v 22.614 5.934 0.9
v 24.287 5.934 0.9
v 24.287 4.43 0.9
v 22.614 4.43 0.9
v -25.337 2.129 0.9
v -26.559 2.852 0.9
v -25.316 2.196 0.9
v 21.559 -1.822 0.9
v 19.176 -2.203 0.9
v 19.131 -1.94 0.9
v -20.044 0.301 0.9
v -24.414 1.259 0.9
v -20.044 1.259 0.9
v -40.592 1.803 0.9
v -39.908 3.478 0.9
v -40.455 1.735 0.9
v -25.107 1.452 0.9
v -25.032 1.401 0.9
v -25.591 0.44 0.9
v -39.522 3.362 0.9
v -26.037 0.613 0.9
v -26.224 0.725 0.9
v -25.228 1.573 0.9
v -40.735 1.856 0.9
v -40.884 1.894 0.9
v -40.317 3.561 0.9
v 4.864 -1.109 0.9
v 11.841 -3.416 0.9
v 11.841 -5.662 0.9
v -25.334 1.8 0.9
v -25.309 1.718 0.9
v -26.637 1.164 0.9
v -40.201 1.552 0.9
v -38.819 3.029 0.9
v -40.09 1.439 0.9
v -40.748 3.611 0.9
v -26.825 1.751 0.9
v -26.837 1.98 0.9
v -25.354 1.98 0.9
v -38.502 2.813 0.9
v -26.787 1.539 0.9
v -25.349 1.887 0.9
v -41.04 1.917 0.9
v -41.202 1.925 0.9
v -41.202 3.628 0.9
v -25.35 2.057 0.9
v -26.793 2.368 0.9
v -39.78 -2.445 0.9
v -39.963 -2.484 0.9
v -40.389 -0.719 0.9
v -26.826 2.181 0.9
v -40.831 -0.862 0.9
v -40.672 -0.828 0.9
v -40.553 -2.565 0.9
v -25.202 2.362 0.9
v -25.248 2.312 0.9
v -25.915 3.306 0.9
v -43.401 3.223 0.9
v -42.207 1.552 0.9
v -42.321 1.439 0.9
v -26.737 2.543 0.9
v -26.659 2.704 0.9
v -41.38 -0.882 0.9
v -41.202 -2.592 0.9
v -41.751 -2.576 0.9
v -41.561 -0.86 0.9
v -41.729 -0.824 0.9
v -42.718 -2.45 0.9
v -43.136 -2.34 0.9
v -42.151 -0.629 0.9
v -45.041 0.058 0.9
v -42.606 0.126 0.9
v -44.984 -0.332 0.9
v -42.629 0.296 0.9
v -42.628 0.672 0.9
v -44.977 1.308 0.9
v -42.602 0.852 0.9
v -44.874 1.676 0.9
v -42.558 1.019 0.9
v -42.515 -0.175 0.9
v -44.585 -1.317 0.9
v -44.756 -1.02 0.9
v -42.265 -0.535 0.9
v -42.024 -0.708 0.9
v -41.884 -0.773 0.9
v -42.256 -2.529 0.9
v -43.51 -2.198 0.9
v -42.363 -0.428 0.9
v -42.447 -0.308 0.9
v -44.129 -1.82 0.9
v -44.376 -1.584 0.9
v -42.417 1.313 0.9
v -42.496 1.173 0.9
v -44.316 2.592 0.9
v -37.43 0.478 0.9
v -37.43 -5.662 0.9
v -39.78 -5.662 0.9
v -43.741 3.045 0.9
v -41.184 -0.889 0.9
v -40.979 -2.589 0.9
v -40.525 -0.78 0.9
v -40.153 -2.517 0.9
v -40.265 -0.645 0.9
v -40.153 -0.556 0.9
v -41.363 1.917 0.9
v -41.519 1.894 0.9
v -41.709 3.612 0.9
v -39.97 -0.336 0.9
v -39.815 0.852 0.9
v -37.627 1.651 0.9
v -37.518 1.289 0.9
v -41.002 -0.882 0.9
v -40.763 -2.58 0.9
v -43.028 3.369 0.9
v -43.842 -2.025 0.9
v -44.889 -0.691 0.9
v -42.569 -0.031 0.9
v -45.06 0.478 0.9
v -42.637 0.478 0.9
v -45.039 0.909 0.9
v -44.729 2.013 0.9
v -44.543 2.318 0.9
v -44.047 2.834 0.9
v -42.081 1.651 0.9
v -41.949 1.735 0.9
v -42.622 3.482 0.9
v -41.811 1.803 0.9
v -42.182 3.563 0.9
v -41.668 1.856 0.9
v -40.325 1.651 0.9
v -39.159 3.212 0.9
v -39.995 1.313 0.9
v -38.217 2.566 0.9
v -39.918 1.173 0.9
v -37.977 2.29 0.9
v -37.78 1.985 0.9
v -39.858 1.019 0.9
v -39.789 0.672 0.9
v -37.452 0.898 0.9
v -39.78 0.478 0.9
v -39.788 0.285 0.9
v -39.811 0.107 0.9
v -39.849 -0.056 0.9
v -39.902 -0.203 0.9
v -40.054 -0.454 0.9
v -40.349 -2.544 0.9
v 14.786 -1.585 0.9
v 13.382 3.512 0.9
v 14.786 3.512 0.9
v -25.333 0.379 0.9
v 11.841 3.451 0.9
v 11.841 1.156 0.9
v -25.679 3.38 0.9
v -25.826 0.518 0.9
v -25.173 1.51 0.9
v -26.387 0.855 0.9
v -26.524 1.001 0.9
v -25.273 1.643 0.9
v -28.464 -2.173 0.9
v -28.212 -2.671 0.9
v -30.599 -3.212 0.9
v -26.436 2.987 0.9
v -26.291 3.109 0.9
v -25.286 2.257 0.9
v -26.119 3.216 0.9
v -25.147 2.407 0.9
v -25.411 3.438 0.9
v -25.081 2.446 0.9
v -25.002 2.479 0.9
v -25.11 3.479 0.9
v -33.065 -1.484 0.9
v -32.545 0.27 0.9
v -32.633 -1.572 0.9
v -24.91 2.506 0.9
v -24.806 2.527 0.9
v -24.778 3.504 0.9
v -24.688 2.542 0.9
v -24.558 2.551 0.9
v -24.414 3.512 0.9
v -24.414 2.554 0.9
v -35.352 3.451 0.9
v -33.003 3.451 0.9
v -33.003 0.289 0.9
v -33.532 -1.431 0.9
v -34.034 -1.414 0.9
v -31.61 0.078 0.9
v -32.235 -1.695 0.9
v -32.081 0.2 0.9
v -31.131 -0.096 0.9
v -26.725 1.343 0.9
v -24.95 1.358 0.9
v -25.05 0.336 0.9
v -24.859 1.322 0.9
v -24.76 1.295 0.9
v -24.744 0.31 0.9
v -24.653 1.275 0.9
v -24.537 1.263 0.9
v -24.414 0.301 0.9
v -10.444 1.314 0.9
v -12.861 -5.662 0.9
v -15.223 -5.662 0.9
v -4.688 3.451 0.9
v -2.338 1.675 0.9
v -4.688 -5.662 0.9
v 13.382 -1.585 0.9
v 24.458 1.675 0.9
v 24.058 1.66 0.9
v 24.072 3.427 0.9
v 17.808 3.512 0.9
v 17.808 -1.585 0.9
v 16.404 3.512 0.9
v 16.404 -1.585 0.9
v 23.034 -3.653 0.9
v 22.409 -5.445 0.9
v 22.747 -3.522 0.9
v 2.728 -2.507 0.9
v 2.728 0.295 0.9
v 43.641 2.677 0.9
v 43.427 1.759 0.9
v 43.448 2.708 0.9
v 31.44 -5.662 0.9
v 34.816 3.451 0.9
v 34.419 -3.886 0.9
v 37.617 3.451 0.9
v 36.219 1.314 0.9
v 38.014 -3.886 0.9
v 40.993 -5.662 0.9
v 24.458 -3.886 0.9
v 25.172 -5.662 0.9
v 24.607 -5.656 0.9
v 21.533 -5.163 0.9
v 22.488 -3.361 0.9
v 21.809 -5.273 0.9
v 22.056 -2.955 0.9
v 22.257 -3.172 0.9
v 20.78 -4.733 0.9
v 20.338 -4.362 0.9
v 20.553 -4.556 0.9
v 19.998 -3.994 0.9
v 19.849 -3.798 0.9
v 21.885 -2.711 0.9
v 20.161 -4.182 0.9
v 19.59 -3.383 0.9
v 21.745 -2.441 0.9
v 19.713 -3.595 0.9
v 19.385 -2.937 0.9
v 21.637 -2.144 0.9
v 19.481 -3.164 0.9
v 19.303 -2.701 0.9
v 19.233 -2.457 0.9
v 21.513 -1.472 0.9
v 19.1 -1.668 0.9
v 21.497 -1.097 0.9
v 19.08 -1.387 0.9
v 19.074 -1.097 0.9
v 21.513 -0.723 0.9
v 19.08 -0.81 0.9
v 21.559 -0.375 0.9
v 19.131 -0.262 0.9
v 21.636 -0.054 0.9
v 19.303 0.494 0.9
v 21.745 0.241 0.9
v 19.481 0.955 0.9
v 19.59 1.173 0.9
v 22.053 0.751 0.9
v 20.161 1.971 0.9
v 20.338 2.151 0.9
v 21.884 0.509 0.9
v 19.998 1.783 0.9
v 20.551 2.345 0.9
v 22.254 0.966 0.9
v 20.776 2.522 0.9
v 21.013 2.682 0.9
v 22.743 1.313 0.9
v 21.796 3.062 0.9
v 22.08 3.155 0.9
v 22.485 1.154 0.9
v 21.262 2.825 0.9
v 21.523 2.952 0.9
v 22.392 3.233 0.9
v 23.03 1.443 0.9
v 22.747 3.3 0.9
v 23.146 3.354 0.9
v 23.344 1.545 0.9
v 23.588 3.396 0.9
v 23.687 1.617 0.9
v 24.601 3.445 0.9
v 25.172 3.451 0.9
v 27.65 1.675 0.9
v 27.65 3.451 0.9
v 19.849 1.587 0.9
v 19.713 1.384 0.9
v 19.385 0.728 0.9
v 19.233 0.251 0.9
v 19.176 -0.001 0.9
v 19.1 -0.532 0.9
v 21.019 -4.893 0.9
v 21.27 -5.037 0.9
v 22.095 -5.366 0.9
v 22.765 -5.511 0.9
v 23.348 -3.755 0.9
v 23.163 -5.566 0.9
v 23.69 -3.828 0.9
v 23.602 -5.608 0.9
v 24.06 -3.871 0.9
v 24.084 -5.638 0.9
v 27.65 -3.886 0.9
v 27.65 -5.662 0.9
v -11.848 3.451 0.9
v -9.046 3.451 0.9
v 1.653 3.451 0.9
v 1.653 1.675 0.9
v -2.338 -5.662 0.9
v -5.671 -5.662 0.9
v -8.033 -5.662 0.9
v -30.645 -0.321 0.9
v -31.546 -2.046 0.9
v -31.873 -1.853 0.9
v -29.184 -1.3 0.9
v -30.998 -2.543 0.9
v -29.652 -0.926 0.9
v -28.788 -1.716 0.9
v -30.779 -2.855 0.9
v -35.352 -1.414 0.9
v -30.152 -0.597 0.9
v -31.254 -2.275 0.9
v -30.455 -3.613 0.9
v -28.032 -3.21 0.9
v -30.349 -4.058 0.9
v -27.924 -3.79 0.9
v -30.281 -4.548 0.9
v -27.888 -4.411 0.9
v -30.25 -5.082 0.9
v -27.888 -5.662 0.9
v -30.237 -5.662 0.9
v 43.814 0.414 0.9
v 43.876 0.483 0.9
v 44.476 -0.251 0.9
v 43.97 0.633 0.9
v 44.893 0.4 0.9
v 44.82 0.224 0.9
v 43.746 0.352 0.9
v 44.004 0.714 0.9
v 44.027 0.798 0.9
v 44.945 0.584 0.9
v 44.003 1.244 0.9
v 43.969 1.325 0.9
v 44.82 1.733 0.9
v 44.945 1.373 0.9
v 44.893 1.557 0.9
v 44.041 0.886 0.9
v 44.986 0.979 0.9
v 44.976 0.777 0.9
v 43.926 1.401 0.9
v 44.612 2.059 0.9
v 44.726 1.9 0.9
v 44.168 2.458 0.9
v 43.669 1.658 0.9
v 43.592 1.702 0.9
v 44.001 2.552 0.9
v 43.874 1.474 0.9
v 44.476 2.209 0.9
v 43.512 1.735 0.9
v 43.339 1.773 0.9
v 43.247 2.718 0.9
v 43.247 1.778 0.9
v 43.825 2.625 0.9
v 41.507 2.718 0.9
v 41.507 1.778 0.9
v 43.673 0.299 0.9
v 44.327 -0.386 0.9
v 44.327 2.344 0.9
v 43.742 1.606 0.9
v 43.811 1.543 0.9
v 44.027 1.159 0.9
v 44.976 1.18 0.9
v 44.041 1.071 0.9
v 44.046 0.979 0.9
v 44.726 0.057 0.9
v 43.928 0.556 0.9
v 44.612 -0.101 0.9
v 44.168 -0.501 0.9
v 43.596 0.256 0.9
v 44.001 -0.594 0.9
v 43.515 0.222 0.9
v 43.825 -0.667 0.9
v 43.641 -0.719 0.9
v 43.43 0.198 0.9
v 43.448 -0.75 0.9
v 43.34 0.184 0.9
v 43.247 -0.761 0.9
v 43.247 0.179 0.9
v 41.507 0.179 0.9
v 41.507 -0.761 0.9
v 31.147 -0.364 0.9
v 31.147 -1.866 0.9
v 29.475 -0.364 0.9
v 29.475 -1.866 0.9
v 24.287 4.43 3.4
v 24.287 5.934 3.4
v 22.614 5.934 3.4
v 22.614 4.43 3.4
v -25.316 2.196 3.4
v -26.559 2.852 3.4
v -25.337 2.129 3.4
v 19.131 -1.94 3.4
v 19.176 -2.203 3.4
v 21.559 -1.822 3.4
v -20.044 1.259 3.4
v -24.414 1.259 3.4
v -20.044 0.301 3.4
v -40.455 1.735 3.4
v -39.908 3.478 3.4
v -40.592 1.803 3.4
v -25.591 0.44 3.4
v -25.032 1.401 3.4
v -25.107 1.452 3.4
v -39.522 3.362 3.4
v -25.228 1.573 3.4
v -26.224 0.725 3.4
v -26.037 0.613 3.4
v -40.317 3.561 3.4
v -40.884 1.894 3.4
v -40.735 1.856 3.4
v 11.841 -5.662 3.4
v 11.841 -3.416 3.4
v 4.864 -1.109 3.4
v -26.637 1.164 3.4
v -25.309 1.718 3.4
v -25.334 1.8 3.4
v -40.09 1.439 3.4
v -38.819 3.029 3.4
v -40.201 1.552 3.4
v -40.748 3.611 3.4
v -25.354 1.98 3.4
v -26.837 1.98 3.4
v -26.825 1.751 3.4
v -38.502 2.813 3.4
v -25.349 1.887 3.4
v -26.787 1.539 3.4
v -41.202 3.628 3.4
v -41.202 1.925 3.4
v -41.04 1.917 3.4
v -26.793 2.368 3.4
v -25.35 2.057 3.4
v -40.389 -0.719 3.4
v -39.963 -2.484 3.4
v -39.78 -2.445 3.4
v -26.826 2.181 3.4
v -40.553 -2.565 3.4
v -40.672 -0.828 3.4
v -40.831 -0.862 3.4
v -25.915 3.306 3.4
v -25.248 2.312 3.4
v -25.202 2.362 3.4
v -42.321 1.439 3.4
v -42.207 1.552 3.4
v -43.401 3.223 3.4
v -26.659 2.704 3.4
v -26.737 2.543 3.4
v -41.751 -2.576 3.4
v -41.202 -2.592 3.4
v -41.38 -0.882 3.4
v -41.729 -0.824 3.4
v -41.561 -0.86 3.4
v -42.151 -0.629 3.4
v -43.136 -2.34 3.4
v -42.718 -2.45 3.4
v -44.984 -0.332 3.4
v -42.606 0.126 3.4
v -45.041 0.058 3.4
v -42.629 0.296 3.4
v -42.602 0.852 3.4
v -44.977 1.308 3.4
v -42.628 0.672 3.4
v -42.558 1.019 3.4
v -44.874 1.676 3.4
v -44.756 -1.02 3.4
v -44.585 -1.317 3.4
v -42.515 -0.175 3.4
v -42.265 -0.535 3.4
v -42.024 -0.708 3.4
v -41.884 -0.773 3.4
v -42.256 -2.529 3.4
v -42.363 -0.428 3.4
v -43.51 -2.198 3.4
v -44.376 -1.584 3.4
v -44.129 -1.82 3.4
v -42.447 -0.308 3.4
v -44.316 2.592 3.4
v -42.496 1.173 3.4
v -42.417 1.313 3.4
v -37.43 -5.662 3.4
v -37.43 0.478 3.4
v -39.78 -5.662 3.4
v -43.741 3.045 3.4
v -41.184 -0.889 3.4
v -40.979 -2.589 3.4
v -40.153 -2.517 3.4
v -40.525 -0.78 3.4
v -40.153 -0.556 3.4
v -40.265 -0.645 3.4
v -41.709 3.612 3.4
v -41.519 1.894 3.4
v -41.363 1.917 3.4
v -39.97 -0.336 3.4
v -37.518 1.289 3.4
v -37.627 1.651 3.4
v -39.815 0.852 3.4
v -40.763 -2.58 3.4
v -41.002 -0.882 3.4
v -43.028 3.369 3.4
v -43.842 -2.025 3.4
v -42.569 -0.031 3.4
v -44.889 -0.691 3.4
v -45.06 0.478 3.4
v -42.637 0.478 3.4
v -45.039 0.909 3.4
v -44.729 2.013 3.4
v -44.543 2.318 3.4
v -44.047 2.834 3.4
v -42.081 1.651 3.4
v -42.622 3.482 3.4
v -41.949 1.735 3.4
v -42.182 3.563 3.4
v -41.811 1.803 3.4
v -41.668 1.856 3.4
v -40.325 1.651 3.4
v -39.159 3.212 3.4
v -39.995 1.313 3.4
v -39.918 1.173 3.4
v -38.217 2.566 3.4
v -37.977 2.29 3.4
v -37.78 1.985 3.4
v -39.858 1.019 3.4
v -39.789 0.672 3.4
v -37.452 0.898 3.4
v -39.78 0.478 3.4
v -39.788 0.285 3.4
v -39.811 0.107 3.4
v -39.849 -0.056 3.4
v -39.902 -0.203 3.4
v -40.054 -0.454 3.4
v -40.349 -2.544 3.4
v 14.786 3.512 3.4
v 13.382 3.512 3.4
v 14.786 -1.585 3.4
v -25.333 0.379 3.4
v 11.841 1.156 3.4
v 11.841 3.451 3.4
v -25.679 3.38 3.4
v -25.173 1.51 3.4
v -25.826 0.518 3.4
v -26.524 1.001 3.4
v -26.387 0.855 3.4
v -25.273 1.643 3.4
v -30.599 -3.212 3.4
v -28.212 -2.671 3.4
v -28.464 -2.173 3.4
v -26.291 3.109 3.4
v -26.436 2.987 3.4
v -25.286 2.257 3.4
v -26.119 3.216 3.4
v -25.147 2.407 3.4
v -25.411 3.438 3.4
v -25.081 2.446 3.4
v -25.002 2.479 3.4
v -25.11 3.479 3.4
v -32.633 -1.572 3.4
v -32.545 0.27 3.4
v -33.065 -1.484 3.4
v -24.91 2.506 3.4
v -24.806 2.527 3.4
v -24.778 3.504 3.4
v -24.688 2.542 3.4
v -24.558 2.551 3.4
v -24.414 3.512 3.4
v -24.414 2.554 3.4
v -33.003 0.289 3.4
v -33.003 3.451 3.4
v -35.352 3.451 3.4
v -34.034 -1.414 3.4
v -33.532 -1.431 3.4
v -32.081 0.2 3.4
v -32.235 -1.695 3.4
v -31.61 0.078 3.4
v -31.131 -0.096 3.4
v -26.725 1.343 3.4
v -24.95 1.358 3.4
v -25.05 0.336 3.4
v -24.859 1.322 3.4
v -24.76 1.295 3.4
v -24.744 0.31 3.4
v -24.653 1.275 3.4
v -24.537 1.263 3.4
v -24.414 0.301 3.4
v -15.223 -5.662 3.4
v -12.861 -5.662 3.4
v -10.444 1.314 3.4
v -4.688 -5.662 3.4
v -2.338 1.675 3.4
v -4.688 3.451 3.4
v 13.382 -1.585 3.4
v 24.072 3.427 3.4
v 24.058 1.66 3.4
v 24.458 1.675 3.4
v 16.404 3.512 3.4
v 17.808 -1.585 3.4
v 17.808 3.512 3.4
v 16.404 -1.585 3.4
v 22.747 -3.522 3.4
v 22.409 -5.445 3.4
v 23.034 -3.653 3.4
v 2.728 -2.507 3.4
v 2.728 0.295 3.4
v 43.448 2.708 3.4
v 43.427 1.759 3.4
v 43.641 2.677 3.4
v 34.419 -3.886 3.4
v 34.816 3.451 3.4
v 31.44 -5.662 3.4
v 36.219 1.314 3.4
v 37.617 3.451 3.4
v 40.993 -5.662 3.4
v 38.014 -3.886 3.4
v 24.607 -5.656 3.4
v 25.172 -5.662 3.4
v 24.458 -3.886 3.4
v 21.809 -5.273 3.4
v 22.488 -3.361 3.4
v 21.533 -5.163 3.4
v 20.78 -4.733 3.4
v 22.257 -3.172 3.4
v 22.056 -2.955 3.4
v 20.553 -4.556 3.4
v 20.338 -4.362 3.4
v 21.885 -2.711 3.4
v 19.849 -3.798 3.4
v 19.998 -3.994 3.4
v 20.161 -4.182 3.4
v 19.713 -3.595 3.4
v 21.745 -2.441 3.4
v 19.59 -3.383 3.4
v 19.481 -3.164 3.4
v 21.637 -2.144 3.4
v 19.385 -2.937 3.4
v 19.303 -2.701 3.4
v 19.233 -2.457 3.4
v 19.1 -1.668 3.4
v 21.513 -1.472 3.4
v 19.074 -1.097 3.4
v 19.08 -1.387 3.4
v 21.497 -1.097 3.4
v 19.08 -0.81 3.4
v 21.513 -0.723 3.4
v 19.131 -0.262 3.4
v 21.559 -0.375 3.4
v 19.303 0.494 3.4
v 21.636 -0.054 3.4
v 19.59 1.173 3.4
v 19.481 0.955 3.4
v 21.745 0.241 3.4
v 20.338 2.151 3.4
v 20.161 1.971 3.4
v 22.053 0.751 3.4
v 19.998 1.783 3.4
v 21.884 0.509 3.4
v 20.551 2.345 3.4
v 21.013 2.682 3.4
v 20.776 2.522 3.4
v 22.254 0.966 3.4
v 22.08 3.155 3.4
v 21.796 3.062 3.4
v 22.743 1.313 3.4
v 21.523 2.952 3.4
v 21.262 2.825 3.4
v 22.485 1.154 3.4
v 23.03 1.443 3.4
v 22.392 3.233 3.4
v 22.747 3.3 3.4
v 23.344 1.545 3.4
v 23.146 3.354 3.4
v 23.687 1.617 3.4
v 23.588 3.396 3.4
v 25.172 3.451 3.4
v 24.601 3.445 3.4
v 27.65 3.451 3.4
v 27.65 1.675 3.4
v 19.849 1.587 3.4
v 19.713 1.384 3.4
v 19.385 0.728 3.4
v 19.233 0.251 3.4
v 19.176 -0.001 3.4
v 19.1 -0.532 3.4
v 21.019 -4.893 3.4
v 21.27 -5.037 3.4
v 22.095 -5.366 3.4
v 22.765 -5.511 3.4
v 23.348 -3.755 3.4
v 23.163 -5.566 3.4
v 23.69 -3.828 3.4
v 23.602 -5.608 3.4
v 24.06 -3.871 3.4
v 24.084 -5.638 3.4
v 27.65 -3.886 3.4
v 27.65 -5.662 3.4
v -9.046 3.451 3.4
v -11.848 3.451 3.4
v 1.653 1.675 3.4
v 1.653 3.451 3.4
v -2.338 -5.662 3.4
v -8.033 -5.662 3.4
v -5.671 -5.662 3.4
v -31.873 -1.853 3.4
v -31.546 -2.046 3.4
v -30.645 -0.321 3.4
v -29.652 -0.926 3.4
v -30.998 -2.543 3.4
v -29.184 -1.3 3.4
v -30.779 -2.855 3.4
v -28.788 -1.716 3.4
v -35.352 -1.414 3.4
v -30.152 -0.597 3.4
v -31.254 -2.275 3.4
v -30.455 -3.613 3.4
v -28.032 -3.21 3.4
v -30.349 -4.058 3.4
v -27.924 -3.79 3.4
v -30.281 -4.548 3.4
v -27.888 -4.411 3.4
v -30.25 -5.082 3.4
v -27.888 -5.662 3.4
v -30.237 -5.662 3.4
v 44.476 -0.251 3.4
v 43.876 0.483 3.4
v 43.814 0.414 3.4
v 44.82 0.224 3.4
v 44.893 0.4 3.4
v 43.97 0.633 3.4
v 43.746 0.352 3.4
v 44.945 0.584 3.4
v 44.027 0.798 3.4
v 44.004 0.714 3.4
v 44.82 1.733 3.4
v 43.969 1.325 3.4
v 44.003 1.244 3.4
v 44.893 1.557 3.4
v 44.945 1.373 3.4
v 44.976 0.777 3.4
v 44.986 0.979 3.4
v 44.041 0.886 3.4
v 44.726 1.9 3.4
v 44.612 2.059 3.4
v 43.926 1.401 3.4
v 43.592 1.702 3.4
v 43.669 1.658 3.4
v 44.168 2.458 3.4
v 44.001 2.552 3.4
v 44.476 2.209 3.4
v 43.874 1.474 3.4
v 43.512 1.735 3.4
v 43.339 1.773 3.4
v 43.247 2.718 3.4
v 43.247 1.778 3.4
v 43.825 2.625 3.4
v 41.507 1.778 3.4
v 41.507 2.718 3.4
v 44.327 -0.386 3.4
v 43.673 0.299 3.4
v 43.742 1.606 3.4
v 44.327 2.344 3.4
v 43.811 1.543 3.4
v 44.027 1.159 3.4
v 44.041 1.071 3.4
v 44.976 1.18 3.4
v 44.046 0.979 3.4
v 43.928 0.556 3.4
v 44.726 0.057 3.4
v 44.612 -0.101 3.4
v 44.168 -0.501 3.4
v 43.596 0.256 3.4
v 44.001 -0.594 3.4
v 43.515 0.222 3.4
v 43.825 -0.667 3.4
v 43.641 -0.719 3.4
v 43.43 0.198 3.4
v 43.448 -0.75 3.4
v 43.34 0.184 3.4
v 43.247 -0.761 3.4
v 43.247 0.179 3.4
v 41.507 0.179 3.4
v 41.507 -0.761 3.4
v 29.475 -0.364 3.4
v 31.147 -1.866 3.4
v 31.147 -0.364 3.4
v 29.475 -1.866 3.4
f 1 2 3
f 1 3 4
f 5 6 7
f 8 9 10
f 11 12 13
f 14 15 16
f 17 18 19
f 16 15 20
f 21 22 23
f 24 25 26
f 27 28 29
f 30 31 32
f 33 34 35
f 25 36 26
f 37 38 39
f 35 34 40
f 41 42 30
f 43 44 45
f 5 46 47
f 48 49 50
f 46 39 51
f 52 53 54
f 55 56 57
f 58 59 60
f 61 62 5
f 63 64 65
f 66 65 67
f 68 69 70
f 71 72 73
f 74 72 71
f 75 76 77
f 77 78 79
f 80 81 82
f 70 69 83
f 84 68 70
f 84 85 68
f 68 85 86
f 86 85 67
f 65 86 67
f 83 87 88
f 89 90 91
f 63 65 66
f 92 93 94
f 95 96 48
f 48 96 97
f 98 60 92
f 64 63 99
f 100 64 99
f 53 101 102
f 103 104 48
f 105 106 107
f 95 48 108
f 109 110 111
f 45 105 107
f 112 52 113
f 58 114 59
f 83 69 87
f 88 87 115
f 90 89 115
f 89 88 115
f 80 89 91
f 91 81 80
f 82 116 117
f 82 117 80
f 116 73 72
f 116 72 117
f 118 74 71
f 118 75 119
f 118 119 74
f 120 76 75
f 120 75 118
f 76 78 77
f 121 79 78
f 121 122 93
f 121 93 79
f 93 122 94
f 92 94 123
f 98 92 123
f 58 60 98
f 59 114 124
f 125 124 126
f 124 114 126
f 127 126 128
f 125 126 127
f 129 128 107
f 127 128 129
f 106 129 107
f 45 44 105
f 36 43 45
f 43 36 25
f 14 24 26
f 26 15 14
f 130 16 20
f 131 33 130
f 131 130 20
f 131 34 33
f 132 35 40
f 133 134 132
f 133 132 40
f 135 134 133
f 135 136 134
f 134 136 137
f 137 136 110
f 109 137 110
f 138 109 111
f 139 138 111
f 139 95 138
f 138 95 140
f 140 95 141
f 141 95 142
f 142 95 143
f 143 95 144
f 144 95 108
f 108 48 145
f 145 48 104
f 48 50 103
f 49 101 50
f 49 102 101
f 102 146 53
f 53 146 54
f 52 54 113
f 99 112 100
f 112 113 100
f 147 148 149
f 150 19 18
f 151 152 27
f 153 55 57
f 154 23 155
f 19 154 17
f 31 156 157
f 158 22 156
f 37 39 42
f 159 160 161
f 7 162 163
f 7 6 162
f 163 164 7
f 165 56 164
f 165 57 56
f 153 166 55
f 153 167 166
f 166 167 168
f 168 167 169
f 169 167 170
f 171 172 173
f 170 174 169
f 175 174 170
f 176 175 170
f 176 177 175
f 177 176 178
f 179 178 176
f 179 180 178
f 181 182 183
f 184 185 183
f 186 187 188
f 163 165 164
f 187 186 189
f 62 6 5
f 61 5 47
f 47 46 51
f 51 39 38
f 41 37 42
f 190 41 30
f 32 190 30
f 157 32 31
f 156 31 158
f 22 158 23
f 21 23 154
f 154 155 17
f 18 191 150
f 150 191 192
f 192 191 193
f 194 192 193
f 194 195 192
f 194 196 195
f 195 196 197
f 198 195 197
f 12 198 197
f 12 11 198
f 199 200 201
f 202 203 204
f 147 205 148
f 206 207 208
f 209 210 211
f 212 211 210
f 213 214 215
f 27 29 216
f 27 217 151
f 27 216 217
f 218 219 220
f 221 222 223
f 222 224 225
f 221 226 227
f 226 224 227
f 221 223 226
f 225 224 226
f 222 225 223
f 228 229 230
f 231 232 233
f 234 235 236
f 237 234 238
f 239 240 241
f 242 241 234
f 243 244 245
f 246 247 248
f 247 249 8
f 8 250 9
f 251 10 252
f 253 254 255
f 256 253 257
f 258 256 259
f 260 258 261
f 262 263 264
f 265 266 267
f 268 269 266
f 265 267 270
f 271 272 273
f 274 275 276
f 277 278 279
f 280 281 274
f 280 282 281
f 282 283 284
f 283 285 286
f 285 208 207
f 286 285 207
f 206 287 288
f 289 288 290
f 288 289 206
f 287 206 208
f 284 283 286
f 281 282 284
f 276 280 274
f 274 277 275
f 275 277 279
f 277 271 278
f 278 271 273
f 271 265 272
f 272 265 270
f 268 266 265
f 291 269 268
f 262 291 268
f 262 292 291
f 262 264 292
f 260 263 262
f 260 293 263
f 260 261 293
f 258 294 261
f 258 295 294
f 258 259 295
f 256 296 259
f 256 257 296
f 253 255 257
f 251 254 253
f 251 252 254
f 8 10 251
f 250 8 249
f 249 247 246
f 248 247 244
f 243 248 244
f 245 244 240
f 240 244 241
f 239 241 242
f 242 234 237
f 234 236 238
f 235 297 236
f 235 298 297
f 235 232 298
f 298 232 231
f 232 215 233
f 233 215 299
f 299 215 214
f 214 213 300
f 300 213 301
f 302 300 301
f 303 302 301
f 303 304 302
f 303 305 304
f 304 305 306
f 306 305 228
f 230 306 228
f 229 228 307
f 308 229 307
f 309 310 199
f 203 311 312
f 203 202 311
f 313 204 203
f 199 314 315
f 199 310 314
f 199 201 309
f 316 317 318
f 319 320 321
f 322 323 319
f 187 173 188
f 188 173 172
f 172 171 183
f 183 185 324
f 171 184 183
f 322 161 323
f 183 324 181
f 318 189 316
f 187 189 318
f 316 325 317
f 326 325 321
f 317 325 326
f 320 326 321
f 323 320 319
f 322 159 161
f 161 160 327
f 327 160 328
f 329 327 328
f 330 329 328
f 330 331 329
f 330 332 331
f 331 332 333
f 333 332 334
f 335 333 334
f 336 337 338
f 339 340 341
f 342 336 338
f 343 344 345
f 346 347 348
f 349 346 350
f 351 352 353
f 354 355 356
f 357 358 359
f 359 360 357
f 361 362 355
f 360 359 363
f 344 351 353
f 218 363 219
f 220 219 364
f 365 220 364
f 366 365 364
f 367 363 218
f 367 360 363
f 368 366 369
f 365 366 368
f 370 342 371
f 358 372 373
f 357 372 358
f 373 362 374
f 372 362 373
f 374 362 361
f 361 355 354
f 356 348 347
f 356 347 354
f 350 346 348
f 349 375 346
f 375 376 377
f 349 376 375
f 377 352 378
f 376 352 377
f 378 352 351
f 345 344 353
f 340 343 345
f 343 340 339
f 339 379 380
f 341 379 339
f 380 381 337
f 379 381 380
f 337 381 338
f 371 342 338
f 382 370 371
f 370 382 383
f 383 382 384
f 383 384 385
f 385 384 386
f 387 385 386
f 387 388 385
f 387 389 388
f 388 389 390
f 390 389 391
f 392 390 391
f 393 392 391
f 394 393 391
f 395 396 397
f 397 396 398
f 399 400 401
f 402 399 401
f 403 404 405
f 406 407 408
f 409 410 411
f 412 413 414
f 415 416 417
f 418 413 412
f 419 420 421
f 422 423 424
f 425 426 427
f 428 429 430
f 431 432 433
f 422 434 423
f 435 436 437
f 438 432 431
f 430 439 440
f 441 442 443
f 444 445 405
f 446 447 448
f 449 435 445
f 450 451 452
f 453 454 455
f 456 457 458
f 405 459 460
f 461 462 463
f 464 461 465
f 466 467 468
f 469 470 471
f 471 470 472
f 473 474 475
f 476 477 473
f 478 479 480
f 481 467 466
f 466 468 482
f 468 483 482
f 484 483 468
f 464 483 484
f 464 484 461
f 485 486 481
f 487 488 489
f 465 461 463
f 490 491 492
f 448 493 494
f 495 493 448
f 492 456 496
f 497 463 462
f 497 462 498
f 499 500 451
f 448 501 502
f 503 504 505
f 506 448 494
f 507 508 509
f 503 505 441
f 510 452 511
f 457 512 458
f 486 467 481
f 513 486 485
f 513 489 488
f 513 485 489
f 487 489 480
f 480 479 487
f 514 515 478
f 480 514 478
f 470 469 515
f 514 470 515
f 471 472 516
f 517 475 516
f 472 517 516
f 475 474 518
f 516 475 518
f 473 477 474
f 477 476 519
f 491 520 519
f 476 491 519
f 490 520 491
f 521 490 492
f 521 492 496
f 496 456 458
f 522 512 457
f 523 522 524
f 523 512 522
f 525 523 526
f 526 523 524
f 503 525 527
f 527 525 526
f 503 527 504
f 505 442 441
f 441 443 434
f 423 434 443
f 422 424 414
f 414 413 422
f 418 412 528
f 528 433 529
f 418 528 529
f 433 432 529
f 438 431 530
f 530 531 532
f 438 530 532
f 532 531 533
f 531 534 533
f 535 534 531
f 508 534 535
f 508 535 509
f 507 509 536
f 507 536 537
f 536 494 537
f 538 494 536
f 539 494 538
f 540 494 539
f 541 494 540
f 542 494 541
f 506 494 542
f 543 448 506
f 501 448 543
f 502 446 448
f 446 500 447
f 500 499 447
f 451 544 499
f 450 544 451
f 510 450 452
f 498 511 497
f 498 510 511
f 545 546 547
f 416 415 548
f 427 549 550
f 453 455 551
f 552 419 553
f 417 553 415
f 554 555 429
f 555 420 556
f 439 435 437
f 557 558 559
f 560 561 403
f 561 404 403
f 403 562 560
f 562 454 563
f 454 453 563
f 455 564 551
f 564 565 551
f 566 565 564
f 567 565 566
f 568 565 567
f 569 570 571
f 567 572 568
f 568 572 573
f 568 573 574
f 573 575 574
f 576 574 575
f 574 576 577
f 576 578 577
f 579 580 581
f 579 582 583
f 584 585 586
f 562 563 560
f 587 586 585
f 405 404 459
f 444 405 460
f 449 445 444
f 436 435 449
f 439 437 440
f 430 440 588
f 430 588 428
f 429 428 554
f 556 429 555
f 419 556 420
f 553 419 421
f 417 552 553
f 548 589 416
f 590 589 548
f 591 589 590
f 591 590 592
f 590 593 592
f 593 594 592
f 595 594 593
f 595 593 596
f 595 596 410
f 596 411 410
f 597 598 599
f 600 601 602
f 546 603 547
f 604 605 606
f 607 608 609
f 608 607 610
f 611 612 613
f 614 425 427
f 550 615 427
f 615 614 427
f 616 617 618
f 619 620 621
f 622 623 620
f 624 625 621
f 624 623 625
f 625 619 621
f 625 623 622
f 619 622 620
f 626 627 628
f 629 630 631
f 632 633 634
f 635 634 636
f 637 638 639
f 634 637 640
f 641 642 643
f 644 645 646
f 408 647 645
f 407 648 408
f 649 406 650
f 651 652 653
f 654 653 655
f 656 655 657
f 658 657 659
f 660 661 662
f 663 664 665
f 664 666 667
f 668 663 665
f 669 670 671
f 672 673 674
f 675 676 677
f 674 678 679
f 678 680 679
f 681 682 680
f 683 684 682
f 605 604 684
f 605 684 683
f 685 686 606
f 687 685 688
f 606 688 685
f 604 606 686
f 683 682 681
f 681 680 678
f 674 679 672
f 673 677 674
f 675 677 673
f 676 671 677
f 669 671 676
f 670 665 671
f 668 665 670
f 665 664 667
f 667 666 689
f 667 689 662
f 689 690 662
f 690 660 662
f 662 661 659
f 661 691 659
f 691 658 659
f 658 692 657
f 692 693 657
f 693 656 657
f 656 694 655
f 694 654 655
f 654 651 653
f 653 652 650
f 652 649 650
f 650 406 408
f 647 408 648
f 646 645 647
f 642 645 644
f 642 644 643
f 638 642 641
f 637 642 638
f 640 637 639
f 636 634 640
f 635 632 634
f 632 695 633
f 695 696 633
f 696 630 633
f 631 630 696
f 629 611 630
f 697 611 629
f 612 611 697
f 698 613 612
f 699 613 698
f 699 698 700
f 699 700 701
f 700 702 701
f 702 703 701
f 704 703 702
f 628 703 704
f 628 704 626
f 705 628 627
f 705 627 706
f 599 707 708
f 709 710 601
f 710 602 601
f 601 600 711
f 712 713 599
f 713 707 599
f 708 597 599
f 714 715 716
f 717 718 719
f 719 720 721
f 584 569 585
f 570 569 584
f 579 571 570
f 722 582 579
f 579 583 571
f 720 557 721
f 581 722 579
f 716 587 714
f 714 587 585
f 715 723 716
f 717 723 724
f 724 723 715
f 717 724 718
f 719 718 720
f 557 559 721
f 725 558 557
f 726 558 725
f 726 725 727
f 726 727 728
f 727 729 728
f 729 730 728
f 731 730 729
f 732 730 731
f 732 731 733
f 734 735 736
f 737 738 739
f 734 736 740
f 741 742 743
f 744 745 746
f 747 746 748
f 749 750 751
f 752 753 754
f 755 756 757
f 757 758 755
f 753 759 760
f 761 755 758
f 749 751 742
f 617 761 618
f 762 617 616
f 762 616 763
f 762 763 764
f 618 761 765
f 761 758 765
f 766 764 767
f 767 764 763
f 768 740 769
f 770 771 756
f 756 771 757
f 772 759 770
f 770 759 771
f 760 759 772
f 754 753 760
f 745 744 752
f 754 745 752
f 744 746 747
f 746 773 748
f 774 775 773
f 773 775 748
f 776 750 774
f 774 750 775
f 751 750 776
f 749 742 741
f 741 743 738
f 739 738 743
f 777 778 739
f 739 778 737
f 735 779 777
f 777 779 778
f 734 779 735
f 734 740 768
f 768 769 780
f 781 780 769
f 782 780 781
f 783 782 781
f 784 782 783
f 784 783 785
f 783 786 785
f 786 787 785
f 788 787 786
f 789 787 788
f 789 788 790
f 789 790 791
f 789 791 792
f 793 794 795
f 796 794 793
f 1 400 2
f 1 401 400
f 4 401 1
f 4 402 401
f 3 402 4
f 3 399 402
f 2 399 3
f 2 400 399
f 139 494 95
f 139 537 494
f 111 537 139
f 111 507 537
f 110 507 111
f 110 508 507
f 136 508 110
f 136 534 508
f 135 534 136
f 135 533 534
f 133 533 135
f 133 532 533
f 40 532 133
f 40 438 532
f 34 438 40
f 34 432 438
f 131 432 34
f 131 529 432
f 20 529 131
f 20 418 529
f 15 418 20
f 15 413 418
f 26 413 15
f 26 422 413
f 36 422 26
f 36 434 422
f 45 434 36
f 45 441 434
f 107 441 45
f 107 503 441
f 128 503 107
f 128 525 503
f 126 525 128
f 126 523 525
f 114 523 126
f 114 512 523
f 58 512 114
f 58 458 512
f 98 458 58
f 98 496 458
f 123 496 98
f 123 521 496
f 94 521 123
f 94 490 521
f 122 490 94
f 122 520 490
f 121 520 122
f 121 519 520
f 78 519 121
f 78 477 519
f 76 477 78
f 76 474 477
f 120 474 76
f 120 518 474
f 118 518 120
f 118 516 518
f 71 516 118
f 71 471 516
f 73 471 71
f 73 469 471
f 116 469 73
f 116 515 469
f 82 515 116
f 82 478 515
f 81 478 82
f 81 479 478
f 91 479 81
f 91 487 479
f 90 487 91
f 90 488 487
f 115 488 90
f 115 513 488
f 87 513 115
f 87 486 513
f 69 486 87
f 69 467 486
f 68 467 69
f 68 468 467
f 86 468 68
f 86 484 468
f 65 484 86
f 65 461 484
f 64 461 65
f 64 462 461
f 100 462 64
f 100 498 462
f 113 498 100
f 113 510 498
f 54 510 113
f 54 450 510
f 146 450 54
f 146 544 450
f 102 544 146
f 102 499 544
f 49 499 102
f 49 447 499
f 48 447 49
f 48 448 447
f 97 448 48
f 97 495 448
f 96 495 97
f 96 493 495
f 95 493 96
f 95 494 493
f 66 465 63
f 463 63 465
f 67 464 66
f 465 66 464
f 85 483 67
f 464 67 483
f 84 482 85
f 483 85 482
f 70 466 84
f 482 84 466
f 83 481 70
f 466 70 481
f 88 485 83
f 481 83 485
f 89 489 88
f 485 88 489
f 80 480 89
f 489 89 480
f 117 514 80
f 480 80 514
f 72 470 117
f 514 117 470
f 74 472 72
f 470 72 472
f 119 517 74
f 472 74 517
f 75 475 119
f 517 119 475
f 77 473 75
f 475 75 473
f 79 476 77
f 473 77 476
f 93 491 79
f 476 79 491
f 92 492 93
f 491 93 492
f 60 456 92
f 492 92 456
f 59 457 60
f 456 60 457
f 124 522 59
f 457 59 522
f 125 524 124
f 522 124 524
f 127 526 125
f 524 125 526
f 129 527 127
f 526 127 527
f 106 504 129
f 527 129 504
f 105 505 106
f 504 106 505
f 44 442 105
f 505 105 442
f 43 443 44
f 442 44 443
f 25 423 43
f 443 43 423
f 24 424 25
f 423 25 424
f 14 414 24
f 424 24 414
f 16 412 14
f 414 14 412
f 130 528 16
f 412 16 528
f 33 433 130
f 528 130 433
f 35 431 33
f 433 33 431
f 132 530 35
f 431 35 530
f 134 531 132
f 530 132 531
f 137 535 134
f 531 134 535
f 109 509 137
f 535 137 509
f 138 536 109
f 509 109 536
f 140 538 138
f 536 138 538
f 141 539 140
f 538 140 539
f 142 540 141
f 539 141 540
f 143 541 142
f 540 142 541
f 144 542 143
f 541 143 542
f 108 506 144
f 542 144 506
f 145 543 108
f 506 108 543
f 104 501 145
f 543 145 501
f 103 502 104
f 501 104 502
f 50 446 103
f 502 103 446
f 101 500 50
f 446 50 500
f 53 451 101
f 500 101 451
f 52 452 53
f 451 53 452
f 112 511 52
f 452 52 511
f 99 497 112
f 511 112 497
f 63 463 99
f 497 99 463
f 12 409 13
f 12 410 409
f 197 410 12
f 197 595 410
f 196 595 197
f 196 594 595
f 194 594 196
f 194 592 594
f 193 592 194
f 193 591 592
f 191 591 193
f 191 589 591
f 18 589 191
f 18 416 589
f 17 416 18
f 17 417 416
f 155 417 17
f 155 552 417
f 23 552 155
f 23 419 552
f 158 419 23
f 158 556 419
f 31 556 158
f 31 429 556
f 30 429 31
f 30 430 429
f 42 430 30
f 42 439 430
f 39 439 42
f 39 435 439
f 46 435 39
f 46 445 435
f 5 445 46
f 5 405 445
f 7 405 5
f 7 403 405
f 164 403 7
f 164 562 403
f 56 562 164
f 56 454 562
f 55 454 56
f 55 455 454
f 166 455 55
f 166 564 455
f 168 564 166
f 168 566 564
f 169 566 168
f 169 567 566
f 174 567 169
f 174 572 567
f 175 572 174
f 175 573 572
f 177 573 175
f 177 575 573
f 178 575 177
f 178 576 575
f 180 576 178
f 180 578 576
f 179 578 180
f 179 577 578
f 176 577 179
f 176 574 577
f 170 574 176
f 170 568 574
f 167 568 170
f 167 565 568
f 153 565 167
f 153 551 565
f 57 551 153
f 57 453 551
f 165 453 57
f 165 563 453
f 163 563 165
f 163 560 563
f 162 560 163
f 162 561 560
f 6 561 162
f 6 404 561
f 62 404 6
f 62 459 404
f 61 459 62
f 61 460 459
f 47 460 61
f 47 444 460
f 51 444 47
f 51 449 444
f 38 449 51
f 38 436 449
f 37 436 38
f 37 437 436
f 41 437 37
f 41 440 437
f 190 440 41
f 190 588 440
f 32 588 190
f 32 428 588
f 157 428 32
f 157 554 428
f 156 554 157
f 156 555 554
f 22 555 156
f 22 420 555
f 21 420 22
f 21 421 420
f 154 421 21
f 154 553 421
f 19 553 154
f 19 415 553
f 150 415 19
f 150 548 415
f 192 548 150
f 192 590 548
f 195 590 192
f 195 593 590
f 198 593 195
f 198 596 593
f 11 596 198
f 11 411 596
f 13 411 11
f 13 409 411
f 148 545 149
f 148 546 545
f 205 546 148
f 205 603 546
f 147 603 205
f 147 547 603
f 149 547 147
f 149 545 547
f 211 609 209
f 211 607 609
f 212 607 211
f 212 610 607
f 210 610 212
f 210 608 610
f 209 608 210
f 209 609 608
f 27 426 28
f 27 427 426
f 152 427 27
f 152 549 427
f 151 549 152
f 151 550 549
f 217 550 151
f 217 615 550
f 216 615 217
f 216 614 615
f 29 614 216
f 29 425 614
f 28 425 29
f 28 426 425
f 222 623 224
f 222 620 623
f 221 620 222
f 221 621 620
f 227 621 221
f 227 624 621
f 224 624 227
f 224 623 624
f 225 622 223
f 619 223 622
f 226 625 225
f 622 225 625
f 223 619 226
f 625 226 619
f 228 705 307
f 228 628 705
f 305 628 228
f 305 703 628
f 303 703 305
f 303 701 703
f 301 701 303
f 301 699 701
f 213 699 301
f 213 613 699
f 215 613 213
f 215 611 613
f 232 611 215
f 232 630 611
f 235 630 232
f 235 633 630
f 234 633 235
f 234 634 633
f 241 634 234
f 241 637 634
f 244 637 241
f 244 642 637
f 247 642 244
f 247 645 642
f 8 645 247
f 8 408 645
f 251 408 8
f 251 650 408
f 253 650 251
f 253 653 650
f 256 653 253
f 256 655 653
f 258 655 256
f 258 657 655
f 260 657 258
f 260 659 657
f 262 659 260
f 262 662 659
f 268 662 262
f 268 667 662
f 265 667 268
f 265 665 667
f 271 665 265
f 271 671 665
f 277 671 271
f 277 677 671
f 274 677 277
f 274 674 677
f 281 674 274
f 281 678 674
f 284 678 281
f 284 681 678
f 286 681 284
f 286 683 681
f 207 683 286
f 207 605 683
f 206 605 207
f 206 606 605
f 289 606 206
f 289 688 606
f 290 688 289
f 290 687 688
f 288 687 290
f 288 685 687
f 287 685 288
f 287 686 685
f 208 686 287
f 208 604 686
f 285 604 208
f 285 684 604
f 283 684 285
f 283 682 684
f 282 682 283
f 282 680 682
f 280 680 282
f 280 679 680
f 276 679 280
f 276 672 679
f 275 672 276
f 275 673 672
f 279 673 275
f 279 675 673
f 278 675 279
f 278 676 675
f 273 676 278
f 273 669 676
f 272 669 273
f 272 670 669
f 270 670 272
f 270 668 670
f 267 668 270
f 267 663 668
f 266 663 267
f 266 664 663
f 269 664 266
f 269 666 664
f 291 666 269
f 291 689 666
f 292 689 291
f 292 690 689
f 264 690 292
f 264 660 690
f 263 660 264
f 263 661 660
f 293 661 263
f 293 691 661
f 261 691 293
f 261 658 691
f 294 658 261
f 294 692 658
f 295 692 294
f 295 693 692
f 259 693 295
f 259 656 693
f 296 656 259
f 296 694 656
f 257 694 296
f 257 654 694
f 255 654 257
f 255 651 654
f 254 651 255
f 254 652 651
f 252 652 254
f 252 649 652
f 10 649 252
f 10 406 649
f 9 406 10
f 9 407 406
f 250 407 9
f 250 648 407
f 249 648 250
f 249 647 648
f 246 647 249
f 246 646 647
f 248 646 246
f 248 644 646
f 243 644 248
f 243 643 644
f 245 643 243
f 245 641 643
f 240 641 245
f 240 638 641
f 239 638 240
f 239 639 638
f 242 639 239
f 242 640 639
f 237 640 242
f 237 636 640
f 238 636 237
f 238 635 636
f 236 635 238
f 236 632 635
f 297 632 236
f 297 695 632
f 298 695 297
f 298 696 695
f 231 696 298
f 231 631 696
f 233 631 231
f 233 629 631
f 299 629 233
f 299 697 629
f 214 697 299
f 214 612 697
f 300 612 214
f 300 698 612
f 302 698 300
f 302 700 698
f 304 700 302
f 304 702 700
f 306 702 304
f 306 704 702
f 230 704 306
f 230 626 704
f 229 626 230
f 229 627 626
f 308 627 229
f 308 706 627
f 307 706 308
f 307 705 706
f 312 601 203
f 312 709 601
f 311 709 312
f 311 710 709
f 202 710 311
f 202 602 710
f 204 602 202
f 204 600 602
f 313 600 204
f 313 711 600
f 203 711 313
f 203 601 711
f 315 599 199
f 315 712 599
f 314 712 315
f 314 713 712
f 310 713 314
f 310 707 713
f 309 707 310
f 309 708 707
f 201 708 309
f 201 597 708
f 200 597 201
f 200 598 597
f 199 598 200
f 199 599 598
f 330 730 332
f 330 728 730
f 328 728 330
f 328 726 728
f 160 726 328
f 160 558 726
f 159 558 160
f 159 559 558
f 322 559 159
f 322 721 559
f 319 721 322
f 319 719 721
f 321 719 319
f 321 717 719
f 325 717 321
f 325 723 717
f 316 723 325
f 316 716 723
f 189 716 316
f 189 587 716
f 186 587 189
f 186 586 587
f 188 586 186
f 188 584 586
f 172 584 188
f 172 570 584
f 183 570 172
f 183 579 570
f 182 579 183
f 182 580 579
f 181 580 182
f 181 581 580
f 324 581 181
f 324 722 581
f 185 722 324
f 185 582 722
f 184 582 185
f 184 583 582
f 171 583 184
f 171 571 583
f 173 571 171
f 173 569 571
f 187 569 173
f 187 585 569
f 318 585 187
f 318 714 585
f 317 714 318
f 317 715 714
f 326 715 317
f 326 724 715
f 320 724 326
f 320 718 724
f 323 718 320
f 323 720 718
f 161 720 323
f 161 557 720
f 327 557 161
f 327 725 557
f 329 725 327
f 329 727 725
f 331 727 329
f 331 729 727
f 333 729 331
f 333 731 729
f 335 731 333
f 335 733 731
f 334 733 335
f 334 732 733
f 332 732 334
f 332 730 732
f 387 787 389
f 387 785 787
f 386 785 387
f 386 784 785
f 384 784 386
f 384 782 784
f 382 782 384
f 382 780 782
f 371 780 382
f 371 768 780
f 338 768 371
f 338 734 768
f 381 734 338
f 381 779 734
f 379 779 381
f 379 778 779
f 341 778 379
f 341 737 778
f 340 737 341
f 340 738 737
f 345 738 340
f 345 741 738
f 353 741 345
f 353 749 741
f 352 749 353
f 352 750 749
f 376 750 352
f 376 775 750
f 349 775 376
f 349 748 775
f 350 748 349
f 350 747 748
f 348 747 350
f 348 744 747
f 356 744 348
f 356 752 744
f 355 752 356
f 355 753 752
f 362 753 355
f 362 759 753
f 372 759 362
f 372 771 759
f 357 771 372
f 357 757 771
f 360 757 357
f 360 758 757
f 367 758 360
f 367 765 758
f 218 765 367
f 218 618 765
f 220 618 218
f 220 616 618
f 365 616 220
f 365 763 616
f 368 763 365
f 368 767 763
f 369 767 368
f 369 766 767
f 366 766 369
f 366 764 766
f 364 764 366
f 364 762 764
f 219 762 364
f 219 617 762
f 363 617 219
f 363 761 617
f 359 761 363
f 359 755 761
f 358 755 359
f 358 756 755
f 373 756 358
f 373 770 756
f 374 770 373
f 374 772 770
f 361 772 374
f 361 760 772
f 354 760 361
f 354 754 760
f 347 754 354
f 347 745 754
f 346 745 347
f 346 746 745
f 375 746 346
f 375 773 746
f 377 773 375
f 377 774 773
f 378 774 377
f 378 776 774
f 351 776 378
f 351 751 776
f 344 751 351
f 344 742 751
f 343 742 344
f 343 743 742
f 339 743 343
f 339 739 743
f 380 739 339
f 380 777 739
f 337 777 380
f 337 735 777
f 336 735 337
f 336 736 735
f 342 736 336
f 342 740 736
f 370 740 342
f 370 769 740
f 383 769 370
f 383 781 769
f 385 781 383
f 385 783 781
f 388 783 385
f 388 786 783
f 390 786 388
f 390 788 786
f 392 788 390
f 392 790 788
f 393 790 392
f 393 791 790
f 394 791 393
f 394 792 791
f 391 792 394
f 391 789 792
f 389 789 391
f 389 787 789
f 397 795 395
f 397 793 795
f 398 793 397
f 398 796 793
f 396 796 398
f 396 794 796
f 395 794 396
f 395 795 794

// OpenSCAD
$fn = 48;
  // syllabics (overlaid on icon, tallest)
  translate([0, 0.000, 0.900]) linear_extrude(height=2.500) text("ᑫᓴᓪ ᐱᒥᐸᐦᑖᐎᐣ", size=9.001, halign="center", valign="center", font="Euphemia UCAS:style=Bold");
